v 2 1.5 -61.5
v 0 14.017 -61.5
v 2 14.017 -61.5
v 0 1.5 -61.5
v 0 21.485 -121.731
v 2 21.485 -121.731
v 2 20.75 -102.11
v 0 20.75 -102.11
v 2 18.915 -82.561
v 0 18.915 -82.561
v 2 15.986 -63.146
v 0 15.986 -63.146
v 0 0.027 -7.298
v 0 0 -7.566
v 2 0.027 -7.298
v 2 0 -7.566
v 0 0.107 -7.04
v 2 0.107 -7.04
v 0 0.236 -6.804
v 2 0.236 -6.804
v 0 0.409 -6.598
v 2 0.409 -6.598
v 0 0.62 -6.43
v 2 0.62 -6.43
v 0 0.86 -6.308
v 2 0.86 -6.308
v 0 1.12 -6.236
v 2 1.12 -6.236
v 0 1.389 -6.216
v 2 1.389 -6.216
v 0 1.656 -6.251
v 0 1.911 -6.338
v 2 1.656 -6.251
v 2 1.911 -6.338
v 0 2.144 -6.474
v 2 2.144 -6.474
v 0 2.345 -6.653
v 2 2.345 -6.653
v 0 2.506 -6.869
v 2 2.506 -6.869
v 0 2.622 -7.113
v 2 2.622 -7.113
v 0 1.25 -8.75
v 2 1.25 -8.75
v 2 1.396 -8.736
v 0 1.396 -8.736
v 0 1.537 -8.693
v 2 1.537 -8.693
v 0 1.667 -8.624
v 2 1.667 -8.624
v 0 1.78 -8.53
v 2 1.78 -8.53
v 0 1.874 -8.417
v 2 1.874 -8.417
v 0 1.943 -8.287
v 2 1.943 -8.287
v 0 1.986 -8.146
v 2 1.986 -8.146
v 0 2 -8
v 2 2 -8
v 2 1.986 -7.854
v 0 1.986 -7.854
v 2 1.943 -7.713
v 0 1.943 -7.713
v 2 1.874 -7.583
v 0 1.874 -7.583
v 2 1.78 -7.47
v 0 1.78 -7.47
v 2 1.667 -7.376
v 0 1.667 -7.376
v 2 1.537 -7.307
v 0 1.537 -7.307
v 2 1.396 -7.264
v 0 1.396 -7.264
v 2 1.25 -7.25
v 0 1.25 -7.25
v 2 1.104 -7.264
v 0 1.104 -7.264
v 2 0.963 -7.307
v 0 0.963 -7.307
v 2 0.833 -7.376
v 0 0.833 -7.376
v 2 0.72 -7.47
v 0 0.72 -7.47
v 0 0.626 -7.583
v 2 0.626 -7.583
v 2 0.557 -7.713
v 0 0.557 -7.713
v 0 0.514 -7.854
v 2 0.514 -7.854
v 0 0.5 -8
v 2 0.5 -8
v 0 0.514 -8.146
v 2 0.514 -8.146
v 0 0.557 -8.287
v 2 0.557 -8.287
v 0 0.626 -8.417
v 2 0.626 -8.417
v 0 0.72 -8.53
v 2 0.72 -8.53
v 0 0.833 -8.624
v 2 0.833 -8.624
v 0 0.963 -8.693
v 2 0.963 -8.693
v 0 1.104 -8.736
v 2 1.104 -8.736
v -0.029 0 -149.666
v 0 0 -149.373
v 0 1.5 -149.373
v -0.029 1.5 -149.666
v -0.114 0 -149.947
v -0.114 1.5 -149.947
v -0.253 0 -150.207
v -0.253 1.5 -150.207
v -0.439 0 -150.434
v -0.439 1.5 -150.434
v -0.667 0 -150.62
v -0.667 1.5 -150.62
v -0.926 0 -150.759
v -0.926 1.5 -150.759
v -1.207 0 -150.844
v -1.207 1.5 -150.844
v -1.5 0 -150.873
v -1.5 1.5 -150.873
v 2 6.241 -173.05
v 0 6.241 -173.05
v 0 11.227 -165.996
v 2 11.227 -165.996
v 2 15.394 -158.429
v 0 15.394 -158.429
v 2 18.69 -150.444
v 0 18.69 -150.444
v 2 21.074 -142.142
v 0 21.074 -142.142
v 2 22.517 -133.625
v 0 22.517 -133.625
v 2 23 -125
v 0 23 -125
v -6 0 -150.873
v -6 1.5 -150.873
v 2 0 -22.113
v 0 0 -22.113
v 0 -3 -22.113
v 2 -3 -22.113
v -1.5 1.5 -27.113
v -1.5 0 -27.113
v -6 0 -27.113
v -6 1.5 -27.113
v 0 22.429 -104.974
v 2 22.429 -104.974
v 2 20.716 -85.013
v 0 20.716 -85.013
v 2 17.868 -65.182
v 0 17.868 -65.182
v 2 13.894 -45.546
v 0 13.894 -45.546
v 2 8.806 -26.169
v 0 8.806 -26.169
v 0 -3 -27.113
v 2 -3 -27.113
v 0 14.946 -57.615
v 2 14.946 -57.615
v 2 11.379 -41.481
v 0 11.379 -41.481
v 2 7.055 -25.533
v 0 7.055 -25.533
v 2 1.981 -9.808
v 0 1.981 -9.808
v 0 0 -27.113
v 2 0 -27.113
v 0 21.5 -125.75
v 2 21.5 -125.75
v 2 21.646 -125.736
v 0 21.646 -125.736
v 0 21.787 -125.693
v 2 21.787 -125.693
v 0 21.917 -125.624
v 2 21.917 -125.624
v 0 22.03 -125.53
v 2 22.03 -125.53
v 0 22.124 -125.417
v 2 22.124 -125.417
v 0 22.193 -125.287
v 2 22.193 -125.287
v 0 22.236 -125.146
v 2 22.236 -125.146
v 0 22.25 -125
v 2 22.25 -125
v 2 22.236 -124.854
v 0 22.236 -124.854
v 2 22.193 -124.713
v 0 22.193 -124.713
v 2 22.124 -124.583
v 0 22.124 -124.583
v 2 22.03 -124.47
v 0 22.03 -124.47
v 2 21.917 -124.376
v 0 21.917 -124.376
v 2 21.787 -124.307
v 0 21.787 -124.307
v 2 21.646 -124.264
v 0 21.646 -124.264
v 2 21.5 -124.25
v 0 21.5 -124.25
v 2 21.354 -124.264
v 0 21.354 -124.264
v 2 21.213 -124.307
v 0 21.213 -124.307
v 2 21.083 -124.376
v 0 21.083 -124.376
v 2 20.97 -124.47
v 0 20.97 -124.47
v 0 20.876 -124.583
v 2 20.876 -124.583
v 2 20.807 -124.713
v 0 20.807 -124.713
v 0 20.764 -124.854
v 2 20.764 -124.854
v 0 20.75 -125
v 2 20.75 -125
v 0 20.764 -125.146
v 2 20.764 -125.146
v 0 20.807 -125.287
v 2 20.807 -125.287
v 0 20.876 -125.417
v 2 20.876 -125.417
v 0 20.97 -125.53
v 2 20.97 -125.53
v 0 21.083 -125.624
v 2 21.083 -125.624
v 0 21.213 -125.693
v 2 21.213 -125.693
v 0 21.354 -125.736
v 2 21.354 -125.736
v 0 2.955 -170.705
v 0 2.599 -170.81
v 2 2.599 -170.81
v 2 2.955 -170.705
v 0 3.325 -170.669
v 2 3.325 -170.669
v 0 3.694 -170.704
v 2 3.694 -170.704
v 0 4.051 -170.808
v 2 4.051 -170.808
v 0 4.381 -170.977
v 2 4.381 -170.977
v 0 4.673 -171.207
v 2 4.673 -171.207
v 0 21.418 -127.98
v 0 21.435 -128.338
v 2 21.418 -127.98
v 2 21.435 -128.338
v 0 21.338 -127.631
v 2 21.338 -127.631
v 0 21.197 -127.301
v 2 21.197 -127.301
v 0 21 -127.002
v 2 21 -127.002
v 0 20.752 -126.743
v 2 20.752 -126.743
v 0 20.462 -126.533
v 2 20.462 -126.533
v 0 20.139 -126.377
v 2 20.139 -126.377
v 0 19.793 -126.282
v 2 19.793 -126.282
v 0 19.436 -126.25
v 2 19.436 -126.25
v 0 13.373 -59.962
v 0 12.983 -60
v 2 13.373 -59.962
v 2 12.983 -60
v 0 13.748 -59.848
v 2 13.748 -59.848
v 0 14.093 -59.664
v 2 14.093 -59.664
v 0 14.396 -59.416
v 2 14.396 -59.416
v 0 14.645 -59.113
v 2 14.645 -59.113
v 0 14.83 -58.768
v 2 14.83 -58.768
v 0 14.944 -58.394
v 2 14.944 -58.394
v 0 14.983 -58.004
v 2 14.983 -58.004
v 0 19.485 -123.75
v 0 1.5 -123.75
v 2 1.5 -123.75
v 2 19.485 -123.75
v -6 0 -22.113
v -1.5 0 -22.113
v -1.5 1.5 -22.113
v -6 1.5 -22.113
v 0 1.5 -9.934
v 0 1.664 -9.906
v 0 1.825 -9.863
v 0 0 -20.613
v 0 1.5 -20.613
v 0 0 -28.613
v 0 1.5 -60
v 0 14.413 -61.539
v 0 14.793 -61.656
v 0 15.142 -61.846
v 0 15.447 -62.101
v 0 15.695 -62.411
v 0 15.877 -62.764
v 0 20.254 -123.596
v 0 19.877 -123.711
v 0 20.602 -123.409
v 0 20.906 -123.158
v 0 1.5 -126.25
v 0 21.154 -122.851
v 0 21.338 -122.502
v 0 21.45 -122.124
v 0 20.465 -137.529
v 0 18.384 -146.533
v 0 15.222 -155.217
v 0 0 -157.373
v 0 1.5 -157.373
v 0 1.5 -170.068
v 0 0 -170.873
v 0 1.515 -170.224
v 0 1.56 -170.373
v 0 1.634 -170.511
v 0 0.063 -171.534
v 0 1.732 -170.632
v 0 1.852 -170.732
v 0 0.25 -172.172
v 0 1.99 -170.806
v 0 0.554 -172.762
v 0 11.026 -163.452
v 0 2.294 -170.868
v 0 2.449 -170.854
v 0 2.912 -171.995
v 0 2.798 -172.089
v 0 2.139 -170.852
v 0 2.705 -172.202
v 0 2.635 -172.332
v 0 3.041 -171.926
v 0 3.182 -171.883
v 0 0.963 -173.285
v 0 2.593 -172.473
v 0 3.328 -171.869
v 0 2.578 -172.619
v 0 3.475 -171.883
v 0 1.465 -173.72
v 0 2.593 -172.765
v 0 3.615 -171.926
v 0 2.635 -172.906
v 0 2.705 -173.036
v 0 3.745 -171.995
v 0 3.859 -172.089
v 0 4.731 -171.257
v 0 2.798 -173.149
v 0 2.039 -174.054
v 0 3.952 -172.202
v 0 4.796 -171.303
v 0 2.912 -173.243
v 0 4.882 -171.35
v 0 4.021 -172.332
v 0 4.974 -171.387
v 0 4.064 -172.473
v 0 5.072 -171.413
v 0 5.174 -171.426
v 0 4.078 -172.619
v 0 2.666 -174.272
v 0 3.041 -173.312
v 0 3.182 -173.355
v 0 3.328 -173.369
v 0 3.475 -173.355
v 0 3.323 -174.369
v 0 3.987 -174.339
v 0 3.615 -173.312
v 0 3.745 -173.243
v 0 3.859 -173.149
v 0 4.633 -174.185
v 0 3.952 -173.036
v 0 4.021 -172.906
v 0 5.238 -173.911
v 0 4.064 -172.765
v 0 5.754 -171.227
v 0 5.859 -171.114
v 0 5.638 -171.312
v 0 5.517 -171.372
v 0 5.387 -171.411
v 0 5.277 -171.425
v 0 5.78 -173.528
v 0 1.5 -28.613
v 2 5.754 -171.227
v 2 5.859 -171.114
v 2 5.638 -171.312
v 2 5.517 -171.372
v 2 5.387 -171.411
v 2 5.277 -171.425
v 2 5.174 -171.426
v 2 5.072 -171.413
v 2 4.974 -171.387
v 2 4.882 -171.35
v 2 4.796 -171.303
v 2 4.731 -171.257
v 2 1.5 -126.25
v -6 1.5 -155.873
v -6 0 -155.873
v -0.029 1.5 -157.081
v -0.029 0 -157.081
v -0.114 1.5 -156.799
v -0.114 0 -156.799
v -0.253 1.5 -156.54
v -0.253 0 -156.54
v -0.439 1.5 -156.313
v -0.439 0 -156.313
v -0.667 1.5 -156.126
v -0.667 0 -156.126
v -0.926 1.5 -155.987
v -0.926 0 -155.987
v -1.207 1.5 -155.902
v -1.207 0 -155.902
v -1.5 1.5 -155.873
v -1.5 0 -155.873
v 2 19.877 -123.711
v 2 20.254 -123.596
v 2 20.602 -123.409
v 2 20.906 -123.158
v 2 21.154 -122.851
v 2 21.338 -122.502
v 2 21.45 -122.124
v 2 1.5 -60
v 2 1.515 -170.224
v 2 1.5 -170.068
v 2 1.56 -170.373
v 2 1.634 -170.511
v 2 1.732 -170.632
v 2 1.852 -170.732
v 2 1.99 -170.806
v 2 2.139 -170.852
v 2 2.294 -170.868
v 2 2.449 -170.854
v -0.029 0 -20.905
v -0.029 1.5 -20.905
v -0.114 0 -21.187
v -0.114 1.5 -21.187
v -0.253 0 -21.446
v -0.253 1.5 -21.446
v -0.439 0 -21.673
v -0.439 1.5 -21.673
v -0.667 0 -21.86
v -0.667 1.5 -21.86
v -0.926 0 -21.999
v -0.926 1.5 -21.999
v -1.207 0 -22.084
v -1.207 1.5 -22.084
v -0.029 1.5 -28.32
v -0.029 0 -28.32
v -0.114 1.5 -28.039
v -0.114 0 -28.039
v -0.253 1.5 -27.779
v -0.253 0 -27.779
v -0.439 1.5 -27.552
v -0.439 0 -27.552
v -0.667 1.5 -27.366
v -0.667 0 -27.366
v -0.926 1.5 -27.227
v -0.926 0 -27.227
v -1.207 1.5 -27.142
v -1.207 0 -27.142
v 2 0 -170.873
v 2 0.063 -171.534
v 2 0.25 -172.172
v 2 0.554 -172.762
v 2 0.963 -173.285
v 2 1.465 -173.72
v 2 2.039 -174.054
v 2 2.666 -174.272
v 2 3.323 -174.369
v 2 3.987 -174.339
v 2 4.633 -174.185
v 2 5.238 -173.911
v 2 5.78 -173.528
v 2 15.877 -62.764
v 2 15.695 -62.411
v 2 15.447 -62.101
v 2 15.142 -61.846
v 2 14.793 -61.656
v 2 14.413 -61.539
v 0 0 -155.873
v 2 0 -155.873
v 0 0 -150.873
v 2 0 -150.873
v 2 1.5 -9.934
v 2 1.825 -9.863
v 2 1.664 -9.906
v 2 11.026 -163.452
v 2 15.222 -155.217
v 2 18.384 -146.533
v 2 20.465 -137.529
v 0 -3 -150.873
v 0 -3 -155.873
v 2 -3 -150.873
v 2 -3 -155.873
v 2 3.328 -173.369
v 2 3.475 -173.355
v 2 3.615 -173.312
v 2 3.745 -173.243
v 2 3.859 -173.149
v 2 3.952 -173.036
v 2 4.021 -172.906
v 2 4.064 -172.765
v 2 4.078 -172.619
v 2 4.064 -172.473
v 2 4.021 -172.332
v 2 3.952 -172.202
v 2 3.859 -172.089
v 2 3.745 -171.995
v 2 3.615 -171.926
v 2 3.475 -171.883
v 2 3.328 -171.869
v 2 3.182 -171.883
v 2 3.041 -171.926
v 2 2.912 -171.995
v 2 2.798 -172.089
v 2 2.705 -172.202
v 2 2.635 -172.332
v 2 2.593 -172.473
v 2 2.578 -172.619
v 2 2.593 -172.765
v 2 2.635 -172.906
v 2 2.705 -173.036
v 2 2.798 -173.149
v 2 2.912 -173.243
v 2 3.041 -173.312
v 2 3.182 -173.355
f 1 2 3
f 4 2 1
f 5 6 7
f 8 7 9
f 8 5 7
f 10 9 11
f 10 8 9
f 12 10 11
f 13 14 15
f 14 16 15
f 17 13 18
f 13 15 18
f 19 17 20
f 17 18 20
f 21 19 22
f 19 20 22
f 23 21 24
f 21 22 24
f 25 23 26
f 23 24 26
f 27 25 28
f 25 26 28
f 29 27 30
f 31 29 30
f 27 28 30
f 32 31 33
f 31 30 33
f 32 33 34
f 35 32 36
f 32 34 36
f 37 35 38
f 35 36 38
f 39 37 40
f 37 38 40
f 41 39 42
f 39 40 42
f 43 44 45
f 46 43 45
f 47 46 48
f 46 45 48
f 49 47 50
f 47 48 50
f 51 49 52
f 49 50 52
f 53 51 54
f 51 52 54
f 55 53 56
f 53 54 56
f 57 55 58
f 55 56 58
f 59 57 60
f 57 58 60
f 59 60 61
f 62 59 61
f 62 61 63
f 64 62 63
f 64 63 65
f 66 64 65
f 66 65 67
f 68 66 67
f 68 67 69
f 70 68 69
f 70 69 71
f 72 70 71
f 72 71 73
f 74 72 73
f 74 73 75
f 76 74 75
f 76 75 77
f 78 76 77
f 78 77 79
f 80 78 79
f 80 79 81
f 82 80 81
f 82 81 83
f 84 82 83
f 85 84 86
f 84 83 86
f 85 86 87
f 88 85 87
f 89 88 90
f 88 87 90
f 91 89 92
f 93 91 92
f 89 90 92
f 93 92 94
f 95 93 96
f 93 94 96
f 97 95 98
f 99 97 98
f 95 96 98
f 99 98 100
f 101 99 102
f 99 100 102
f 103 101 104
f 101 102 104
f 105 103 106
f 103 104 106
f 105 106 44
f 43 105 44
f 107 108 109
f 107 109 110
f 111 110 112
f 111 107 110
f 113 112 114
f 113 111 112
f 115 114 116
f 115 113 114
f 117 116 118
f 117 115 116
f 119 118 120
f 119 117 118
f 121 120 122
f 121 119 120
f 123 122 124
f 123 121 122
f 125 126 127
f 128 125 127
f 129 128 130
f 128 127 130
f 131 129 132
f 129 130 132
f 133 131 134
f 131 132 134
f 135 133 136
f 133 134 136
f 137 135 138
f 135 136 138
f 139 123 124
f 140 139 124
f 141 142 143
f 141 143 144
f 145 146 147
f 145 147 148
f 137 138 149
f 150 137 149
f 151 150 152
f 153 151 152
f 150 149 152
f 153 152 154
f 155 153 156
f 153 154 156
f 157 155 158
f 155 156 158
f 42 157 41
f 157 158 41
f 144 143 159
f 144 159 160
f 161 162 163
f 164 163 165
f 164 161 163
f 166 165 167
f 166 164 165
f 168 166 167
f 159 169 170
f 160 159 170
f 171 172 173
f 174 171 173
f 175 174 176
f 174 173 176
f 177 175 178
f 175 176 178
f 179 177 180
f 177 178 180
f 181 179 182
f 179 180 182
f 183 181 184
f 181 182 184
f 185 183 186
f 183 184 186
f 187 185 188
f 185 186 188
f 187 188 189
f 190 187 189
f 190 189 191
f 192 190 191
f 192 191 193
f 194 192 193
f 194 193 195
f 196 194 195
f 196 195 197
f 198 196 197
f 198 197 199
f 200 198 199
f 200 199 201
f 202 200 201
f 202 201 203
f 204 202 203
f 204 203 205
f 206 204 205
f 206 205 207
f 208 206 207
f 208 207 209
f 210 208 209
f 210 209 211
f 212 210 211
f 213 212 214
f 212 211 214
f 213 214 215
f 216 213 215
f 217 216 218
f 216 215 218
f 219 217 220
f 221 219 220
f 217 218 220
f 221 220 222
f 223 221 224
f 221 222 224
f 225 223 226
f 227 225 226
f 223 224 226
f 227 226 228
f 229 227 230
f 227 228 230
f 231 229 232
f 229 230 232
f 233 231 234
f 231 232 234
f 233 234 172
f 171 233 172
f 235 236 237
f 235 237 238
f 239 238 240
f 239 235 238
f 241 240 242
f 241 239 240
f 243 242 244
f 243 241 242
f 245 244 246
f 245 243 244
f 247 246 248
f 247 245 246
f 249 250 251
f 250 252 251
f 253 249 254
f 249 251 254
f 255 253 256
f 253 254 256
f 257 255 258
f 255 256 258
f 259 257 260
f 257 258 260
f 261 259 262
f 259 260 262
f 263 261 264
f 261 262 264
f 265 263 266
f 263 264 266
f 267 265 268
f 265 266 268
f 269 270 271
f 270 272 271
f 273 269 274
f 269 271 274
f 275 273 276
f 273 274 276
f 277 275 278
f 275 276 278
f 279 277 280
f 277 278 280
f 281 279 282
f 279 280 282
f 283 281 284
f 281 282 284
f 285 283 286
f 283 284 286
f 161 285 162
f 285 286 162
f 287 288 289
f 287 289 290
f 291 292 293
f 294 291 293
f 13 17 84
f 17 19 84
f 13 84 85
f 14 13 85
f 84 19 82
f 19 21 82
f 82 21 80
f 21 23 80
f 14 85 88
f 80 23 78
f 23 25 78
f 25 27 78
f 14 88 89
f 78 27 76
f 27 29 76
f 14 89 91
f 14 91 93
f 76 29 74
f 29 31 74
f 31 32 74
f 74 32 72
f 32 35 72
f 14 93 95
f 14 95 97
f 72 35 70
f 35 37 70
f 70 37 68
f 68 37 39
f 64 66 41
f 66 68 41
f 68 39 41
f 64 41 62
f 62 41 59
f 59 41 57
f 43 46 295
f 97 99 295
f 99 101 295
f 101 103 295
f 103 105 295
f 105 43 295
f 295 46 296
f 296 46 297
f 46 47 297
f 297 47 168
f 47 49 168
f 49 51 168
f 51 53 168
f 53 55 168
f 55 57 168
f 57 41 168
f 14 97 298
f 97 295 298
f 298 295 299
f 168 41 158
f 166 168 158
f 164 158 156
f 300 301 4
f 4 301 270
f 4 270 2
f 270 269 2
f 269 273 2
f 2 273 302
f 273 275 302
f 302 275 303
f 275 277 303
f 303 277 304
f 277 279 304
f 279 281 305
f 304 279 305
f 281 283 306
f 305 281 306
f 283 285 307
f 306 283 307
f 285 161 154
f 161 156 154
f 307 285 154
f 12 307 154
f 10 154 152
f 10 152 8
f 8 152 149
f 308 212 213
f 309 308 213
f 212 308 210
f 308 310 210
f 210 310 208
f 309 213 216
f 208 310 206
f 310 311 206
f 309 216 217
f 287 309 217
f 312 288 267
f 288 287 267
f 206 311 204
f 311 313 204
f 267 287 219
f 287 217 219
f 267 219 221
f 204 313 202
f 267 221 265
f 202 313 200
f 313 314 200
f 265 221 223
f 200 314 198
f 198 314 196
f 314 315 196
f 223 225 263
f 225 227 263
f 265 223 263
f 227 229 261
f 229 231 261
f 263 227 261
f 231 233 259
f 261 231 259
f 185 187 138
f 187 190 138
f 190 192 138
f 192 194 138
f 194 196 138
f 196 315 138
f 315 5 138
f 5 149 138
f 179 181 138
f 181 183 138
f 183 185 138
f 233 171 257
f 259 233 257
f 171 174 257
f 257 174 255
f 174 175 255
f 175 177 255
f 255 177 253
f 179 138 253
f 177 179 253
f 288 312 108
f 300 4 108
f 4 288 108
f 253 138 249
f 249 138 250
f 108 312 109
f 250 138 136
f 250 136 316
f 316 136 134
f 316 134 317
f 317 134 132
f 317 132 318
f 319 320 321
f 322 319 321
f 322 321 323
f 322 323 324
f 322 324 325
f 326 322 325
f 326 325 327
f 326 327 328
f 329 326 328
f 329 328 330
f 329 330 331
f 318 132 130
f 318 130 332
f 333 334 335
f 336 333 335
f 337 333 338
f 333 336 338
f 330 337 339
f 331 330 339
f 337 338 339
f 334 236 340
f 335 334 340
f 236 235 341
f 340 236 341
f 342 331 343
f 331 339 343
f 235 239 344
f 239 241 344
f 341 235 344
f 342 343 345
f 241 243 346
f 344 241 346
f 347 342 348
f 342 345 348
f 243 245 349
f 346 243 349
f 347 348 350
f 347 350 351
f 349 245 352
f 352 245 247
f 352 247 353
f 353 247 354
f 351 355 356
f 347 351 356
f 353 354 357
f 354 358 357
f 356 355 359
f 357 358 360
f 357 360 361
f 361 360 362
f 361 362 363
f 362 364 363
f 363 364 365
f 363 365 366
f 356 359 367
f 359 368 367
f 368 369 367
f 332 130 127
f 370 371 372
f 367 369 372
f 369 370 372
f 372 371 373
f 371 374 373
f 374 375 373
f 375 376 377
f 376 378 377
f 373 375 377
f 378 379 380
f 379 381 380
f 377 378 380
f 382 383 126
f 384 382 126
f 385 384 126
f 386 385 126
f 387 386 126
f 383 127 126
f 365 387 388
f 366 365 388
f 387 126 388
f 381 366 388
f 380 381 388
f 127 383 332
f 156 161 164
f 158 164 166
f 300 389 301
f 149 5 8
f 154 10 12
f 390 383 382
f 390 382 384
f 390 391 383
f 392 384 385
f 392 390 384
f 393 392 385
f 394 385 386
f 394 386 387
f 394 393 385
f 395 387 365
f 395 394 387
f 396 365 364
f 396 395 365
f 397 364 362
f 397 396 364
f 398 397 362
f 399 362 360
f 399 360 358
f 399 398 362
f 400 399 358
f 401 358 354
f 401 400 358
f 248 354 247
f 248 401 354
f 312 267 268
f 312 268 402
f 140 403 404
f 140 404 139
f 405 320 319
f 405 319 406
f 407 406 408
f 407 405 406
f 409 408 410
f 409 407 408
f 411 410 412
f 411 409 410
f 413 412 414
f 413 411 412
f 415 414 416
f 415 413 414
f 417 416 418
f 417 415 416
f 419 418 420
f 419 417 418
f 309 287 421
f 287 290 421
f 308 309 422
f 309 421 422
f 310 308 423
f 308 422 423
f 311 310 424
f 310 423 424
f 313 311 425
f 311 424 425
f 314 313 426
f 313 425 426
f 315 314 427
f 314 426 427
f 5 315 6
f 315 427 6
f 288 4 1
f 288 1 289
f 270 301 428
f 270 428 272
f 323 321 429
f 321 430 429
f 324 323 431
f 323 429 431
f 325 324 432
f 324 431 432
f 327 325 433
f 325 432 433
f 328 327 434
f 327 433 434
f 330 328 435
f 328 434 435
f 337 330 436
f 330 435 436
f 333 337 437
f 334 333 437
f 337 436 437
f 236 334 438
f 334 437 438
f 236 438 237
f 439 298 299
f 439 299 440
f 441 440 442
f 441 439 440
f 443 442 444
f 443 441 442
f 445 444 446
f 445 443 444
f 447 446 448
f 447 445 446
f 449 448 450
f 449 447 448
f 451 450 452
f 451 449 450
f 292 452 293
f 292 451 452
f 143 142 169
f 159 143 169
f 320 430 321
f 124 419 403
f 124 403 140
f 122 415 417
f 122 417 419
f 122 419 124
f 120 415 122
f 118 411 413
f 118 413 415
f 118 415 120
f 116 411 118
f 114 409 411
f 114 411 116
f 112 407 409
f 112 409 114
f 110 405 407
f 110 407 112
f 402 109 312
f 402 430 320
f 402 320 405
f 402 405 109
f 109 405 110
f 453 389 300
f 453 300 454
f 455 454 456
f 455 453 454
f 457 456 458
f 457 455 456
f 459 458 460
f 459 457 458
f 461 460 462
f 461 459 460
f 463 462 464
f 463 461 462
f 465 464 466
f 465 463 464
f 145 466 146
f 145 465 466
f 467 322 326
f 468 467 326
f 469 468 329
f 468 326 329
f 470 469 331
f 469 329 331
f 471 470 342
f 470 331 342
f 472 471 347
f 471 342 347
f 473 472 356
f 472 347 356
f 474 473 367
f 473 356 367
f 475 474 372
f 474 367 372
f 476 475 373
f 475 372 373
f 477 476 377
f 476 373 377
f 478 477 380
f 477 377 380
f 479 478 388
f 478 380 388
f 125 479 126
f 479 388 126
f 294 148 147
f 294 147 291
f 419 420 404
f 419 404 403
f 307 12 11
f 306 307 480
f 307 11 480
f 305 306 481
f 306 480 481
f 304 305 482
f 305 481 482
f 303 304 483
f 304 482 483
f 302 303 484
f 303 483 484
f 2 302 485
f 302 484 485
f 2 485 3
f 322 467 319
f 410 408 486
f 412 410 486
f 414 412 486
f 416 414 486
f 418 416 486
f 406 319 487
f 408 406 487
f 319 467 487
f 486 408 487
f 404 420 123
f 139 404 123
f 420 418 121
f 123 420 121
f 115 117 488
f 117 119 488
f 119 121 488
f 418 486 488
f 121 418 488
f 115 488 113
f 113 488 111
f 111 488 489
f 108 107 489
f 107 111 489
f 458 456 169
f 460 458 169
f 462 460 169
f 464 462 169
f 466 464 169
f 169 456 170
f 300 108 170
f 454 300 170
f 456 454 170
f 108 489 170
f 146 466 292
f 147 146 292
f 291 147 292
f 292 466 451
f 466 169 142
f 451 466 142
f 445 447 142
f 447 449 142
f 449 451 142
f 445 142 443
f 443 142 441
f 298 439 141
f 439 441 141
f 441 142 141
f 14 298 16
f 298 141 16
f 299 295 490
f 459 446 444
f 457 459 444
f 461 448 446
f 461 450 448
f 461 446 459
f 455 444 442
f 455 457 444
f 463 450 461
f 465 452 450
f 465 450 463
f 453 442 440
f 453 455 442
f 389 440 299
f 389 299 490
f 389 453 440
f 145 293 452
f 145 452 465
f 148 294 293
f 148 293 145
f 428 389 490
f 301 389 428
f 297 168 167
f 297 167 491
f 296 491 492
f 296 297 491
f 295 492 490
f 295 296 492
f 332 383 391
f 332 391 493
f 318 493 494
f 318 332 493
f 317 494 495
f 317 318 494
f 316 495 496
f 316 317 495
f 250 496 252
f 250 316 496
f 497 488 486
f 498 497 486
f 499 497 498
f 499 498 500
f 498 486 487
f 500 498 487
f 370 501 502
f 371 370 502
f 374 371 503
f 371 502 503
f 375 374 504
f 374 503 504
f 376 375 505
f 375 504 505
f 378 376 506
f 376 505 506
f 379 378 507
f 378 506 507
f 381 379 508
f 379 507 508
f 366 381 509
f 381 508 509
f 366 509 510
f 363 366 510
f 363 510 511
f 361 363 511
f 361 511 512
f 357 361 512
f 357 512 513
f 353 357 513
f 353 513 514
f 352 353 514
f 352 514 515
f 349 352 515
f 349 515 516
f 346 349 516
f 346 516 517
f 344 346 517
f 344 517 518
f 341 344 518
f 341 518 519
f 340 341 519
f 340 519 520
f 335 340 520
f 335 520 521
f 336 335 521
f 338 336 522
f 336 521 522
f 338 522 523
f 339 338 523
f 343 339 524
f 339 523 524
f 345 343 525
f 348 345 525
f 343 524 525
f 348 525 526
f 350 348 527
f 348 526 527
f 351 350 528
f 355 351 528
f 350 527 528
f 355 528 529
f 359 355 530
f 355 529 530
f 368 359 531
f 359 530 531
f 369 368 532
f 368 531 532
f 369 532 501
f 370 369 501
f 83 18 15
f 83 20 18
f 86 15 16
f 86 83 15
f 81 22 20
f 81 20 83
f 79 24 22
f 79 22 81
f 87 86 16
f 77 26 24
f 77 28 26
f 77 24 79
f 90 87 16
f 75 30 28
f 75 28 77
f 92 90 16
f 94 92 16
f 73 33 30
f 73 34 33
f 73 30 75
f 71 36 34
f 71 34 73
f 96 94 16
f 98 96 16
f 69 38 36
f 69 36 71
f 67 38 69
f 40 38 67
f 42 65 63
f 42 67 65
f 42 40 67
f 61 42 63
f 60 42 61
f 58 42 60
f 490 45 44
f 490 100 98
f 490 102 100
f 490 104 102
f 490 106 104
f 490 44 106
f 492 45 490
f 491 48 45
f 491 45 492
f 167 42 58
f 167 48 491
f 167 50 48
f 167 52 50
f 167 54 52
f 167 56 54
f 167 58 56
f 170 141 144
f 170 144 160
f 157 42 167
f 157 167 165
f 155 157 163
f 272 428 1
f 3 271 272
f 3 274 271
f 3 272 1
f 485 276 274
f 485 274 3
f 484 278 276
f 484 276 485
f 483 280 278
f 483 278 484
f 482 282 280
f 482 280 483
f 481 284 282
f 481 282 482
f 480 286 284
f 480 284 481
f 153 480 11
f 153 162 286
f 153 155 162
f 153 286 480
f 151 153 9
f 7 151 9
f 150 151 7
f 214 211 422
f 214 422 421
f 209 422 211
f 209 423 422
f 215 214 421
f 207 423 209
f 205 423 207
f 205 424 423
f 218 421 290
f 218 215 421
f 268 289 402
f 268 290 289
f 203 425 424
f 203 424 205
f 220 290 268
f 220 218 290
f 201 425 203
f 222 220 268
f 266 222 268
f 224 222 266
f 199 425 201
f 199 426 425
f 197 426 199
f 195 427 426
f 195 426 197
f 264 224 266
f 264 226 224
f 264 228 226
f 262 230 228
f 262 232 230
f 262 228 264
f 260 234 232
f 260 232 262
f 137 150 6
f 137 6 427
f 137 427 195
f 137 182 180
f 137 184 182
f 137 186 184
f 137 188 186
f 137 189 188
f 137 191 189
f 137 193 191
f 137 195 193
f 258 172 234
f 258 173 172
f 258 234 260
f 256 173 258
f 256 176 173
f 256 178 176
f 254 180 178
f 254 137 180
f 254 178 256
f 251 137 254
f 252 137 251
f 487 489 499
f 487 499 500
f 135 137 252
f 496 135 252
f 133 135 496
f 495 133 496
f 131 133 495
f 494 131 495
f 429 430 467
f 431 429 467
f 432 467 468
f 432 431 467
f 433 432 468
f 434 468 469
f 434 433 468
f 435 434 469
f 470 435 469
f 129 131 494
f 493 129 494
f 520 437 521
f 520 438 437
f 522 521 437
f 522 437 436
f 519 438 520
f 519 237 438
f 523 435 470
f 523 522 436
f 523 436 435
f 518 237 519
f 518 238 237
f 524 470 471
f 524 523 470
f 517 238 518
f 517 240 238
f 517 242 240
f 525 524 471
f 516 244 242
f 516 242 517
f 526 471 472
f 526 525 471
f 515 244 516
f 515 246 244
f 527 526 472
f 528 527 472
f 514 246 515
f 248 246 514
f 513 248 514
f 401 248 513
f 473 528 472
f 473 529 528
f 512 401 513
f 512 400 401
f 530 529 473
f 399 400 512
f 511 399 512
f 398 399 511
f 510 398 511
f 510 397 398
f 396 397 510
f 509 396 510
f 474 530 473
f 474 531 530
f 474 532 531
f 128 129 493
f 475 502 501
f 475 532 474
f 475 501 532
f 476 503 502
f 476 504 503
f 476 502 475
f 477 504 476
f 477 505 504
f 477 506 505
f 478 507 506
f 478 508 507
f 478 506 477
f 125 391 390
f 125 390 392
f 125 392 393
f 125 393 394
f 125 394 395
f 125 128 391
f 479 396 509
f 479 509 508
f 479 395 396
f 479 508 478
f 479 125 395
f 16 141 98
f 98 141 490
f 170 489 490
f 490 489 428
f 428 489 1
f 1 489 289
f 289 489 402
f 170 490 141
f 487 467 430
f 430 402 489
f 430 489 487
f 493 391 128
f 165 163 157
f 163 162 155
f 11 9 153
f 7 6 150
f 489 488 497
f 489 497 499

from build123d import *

# Parameters (mm, degrees)
BOSS_EXTRU_1_DEPTH      = 2
ESQUISSE4_R             = 0.75
ENL_V_MAT_EXTRU_2_DEPTH = 176.894862906
ENL_V_MAT_EXTRU_3_DEPTH = 4
CONG_2_R                = 1.35
ESQUISSE12_W            = 2
ESQUISSE12_H            = 5
BOSS_EXTRU_2_DEPTH      = 3
CONG_3_R                = 2
CONG_4_R                = 0.8
ESQUISSE13_W            = 5
ESQUISSE13_H            = 1.5
BOSS_EXTRU_3_DEPTH      = 6
CONG_5_R                = 1.5


with BuildPart() as part:
    # Esquisse2 → Boss.-Extru.1 (new body)
    with BuildSketch(Plane(origin=(0, 0, 0), x_dir=(0, 0, -1), z_dir=(1, 0, 0))):
        with BuildLine():
            Line((0, 0), (170.873171093, 0))
            ThreePointArc((170.873171093, 0), (174.177922559, 2.347343181), (173.049882129, 6.240789861))
            ThreePointArc((173.049882129, 6.240789861), (150.444362328, 18.689979585), (125, 23))
            ThreePointArc((125, 23), (61.450806457, 17.202138822), (0, 0))
        make_face()
    extrude(amount=BOSS_EXTRU_1_DEPTH)

    # Esquisse4 → Enlèv. mat.-Extru.2 (cut, through all)
    with BuildSketch(Plane(origin=(2, 0, 0), x_dir=(0, 0, -1), z_dir=(1, 0, 0))):
        with Locations((125, 21.5)):
            Circle(ESQUISSE4_R)
        with Locations((172.618958832, 3.328337296)):
            Circle(ESQUISSE4_R)
        with Locations((8, 1.25)):
            Circle(ESQUISSE4_R)
    extrude(amount=-ENL_V_MAT_EXTRU_2_DEPTH, mode=Mode.SUBTRACT)

    # Esquisse9 → Enlèv. mat.-Extru.3 (cut)
    with BuildSketch(Plane(origin=(0, 0, 0), x_dir=(0, 0, -1), z_dir=(1, 0, 0))):
        with BuildLine():
            Line((126.249998003, 1.5), (171.940959768, 1.5))
            ThreePointArc((171.940959768, 1.5), (170.669151645, 3.355758734), (171.992643995, 5.175018028))
            ThreePointArc((171.992643995, 5.175018028), (150.464605834, 17.100795028), (126.249998003, 21.497765776))
            Line((126.249998003, 21.497765776), (126.249998003, 1.5))
        make_face()
        with BuildLine():
            Line((9.933907961, 1.5), (60, 1.5))
            Line((60, 1.5), (60, 15.405547145))
            ThreePointArc((60, 15.405547145), (34.654135968, 9.627019927), (9.807619224, 1.981445651))
            ThreePointArc((9.807619224, 1.981445651), (9.886187662, 1.744768736), (9.933907961, 1.5))
        make_face()
        with BuildLine():
            Line((61.5, 1.5), (123.750001997, 1.5))
            Line((123.750001997, 1.5), (123.750001997, 21.497765776))
            ThreePointArc((123.750001997, 21.497765776), (92.494848054, 19.985907384), (61.5, 15.685935533))
            Line((61.5, 15.685935533), (61.5, 1.5))
        make_face()
    extrude(amount=ENL_V_MAT_EXTRU_3_DEPTH, mode=Mode.SUBTRACT)

    # Congé2
    cong_2_edges = [part.edges().sort_by_distance(p)[0] for p in [
        (1, 0, 0),
    ]]
    fillet(cong_2_edges, radius=CONG_2_R)

    # Esquisse12 → Boss.-Extru.2 (add)
    with BuildSketch(Plane.XZ):
        with Locations((1, -153.373171093)):
            Rectangle(ESQUISSE12_W, ESQUISSE12_H)
        with Locations((1, -24.612741703)):
            Rectangle(ESQUISSE12_W, ESQUISSE12_H)
    extrude(amount=BOSS_EXTRU_2_DEPTH)

    # Congé3
    cong_3_edges = [part.edges().sort_by_distance(p)[0] for p in [
        (1, 15.405547145, -60),
        (1, 21.497765776, -126.249998003),
        (1, 21.497765776, -123.750001997),
        (1, 15.685935533, -61.5),
    ]]
    fillet(cong_3_edges, radius=CONG_3_R)

    # Congé4
    cong_4_edges = [part.edges().sort_by_distance(p)[0] for p in [
        (1, 5.175018028, -171.992643995),
        (1, 1.5, -171.940959768),
    ]]
    fillet(cong_4_edges, radius=CONG_4_R)

    # Esquisse13 → Boss.-Extru.3 (add)
    with BuildSketch(Plane.ZY):
        with Locations((-153.373171093, 0.75)):
            Rectangle(ESQUISSE13_W, ESQUISSE13_H)
        with Locations((-24.612741703, 0.75)):
            Rectangle(ESQUISSE13_W, ESQUISSE13_H)
    extrude(amount=BOSS_EXTRU_3_DEPTH)

    # Congé5
    # the kernel refuses this fillet: 1.5 mm, written as the material it adds along each edge
    with BuildSketch(Plane(origin=(0, 1.5, -155.873171093), x_dir=(0, 0, -1), z_dir=(0, -1, 0)), Plane(origin=(0, 0, -150.873171093), x_dir=(0, 0, 1), z_dir=(0, 1, 0)), Plane(origin=(0, 1.5, -27.112741703), x_dir=(0, 0, -1), z_dir=(0, -1, 0)), Plane(origin=(0, 0, -22.112741703), x_dir=(0, 0, 1), z_dir=(0, 1, 0))) as cong_5_piece_1:
        with BuildLine():
            CenterArc((CONG_5_R, -CONG_5_R), CONG_5_R, 90, 90)
            Line((0, -CONG_5_R), (0, 0))
            Line((0, 0), (CONG_5_R, 0))
        make_face()
    extrude(amount=1.5)


solid = part.part
